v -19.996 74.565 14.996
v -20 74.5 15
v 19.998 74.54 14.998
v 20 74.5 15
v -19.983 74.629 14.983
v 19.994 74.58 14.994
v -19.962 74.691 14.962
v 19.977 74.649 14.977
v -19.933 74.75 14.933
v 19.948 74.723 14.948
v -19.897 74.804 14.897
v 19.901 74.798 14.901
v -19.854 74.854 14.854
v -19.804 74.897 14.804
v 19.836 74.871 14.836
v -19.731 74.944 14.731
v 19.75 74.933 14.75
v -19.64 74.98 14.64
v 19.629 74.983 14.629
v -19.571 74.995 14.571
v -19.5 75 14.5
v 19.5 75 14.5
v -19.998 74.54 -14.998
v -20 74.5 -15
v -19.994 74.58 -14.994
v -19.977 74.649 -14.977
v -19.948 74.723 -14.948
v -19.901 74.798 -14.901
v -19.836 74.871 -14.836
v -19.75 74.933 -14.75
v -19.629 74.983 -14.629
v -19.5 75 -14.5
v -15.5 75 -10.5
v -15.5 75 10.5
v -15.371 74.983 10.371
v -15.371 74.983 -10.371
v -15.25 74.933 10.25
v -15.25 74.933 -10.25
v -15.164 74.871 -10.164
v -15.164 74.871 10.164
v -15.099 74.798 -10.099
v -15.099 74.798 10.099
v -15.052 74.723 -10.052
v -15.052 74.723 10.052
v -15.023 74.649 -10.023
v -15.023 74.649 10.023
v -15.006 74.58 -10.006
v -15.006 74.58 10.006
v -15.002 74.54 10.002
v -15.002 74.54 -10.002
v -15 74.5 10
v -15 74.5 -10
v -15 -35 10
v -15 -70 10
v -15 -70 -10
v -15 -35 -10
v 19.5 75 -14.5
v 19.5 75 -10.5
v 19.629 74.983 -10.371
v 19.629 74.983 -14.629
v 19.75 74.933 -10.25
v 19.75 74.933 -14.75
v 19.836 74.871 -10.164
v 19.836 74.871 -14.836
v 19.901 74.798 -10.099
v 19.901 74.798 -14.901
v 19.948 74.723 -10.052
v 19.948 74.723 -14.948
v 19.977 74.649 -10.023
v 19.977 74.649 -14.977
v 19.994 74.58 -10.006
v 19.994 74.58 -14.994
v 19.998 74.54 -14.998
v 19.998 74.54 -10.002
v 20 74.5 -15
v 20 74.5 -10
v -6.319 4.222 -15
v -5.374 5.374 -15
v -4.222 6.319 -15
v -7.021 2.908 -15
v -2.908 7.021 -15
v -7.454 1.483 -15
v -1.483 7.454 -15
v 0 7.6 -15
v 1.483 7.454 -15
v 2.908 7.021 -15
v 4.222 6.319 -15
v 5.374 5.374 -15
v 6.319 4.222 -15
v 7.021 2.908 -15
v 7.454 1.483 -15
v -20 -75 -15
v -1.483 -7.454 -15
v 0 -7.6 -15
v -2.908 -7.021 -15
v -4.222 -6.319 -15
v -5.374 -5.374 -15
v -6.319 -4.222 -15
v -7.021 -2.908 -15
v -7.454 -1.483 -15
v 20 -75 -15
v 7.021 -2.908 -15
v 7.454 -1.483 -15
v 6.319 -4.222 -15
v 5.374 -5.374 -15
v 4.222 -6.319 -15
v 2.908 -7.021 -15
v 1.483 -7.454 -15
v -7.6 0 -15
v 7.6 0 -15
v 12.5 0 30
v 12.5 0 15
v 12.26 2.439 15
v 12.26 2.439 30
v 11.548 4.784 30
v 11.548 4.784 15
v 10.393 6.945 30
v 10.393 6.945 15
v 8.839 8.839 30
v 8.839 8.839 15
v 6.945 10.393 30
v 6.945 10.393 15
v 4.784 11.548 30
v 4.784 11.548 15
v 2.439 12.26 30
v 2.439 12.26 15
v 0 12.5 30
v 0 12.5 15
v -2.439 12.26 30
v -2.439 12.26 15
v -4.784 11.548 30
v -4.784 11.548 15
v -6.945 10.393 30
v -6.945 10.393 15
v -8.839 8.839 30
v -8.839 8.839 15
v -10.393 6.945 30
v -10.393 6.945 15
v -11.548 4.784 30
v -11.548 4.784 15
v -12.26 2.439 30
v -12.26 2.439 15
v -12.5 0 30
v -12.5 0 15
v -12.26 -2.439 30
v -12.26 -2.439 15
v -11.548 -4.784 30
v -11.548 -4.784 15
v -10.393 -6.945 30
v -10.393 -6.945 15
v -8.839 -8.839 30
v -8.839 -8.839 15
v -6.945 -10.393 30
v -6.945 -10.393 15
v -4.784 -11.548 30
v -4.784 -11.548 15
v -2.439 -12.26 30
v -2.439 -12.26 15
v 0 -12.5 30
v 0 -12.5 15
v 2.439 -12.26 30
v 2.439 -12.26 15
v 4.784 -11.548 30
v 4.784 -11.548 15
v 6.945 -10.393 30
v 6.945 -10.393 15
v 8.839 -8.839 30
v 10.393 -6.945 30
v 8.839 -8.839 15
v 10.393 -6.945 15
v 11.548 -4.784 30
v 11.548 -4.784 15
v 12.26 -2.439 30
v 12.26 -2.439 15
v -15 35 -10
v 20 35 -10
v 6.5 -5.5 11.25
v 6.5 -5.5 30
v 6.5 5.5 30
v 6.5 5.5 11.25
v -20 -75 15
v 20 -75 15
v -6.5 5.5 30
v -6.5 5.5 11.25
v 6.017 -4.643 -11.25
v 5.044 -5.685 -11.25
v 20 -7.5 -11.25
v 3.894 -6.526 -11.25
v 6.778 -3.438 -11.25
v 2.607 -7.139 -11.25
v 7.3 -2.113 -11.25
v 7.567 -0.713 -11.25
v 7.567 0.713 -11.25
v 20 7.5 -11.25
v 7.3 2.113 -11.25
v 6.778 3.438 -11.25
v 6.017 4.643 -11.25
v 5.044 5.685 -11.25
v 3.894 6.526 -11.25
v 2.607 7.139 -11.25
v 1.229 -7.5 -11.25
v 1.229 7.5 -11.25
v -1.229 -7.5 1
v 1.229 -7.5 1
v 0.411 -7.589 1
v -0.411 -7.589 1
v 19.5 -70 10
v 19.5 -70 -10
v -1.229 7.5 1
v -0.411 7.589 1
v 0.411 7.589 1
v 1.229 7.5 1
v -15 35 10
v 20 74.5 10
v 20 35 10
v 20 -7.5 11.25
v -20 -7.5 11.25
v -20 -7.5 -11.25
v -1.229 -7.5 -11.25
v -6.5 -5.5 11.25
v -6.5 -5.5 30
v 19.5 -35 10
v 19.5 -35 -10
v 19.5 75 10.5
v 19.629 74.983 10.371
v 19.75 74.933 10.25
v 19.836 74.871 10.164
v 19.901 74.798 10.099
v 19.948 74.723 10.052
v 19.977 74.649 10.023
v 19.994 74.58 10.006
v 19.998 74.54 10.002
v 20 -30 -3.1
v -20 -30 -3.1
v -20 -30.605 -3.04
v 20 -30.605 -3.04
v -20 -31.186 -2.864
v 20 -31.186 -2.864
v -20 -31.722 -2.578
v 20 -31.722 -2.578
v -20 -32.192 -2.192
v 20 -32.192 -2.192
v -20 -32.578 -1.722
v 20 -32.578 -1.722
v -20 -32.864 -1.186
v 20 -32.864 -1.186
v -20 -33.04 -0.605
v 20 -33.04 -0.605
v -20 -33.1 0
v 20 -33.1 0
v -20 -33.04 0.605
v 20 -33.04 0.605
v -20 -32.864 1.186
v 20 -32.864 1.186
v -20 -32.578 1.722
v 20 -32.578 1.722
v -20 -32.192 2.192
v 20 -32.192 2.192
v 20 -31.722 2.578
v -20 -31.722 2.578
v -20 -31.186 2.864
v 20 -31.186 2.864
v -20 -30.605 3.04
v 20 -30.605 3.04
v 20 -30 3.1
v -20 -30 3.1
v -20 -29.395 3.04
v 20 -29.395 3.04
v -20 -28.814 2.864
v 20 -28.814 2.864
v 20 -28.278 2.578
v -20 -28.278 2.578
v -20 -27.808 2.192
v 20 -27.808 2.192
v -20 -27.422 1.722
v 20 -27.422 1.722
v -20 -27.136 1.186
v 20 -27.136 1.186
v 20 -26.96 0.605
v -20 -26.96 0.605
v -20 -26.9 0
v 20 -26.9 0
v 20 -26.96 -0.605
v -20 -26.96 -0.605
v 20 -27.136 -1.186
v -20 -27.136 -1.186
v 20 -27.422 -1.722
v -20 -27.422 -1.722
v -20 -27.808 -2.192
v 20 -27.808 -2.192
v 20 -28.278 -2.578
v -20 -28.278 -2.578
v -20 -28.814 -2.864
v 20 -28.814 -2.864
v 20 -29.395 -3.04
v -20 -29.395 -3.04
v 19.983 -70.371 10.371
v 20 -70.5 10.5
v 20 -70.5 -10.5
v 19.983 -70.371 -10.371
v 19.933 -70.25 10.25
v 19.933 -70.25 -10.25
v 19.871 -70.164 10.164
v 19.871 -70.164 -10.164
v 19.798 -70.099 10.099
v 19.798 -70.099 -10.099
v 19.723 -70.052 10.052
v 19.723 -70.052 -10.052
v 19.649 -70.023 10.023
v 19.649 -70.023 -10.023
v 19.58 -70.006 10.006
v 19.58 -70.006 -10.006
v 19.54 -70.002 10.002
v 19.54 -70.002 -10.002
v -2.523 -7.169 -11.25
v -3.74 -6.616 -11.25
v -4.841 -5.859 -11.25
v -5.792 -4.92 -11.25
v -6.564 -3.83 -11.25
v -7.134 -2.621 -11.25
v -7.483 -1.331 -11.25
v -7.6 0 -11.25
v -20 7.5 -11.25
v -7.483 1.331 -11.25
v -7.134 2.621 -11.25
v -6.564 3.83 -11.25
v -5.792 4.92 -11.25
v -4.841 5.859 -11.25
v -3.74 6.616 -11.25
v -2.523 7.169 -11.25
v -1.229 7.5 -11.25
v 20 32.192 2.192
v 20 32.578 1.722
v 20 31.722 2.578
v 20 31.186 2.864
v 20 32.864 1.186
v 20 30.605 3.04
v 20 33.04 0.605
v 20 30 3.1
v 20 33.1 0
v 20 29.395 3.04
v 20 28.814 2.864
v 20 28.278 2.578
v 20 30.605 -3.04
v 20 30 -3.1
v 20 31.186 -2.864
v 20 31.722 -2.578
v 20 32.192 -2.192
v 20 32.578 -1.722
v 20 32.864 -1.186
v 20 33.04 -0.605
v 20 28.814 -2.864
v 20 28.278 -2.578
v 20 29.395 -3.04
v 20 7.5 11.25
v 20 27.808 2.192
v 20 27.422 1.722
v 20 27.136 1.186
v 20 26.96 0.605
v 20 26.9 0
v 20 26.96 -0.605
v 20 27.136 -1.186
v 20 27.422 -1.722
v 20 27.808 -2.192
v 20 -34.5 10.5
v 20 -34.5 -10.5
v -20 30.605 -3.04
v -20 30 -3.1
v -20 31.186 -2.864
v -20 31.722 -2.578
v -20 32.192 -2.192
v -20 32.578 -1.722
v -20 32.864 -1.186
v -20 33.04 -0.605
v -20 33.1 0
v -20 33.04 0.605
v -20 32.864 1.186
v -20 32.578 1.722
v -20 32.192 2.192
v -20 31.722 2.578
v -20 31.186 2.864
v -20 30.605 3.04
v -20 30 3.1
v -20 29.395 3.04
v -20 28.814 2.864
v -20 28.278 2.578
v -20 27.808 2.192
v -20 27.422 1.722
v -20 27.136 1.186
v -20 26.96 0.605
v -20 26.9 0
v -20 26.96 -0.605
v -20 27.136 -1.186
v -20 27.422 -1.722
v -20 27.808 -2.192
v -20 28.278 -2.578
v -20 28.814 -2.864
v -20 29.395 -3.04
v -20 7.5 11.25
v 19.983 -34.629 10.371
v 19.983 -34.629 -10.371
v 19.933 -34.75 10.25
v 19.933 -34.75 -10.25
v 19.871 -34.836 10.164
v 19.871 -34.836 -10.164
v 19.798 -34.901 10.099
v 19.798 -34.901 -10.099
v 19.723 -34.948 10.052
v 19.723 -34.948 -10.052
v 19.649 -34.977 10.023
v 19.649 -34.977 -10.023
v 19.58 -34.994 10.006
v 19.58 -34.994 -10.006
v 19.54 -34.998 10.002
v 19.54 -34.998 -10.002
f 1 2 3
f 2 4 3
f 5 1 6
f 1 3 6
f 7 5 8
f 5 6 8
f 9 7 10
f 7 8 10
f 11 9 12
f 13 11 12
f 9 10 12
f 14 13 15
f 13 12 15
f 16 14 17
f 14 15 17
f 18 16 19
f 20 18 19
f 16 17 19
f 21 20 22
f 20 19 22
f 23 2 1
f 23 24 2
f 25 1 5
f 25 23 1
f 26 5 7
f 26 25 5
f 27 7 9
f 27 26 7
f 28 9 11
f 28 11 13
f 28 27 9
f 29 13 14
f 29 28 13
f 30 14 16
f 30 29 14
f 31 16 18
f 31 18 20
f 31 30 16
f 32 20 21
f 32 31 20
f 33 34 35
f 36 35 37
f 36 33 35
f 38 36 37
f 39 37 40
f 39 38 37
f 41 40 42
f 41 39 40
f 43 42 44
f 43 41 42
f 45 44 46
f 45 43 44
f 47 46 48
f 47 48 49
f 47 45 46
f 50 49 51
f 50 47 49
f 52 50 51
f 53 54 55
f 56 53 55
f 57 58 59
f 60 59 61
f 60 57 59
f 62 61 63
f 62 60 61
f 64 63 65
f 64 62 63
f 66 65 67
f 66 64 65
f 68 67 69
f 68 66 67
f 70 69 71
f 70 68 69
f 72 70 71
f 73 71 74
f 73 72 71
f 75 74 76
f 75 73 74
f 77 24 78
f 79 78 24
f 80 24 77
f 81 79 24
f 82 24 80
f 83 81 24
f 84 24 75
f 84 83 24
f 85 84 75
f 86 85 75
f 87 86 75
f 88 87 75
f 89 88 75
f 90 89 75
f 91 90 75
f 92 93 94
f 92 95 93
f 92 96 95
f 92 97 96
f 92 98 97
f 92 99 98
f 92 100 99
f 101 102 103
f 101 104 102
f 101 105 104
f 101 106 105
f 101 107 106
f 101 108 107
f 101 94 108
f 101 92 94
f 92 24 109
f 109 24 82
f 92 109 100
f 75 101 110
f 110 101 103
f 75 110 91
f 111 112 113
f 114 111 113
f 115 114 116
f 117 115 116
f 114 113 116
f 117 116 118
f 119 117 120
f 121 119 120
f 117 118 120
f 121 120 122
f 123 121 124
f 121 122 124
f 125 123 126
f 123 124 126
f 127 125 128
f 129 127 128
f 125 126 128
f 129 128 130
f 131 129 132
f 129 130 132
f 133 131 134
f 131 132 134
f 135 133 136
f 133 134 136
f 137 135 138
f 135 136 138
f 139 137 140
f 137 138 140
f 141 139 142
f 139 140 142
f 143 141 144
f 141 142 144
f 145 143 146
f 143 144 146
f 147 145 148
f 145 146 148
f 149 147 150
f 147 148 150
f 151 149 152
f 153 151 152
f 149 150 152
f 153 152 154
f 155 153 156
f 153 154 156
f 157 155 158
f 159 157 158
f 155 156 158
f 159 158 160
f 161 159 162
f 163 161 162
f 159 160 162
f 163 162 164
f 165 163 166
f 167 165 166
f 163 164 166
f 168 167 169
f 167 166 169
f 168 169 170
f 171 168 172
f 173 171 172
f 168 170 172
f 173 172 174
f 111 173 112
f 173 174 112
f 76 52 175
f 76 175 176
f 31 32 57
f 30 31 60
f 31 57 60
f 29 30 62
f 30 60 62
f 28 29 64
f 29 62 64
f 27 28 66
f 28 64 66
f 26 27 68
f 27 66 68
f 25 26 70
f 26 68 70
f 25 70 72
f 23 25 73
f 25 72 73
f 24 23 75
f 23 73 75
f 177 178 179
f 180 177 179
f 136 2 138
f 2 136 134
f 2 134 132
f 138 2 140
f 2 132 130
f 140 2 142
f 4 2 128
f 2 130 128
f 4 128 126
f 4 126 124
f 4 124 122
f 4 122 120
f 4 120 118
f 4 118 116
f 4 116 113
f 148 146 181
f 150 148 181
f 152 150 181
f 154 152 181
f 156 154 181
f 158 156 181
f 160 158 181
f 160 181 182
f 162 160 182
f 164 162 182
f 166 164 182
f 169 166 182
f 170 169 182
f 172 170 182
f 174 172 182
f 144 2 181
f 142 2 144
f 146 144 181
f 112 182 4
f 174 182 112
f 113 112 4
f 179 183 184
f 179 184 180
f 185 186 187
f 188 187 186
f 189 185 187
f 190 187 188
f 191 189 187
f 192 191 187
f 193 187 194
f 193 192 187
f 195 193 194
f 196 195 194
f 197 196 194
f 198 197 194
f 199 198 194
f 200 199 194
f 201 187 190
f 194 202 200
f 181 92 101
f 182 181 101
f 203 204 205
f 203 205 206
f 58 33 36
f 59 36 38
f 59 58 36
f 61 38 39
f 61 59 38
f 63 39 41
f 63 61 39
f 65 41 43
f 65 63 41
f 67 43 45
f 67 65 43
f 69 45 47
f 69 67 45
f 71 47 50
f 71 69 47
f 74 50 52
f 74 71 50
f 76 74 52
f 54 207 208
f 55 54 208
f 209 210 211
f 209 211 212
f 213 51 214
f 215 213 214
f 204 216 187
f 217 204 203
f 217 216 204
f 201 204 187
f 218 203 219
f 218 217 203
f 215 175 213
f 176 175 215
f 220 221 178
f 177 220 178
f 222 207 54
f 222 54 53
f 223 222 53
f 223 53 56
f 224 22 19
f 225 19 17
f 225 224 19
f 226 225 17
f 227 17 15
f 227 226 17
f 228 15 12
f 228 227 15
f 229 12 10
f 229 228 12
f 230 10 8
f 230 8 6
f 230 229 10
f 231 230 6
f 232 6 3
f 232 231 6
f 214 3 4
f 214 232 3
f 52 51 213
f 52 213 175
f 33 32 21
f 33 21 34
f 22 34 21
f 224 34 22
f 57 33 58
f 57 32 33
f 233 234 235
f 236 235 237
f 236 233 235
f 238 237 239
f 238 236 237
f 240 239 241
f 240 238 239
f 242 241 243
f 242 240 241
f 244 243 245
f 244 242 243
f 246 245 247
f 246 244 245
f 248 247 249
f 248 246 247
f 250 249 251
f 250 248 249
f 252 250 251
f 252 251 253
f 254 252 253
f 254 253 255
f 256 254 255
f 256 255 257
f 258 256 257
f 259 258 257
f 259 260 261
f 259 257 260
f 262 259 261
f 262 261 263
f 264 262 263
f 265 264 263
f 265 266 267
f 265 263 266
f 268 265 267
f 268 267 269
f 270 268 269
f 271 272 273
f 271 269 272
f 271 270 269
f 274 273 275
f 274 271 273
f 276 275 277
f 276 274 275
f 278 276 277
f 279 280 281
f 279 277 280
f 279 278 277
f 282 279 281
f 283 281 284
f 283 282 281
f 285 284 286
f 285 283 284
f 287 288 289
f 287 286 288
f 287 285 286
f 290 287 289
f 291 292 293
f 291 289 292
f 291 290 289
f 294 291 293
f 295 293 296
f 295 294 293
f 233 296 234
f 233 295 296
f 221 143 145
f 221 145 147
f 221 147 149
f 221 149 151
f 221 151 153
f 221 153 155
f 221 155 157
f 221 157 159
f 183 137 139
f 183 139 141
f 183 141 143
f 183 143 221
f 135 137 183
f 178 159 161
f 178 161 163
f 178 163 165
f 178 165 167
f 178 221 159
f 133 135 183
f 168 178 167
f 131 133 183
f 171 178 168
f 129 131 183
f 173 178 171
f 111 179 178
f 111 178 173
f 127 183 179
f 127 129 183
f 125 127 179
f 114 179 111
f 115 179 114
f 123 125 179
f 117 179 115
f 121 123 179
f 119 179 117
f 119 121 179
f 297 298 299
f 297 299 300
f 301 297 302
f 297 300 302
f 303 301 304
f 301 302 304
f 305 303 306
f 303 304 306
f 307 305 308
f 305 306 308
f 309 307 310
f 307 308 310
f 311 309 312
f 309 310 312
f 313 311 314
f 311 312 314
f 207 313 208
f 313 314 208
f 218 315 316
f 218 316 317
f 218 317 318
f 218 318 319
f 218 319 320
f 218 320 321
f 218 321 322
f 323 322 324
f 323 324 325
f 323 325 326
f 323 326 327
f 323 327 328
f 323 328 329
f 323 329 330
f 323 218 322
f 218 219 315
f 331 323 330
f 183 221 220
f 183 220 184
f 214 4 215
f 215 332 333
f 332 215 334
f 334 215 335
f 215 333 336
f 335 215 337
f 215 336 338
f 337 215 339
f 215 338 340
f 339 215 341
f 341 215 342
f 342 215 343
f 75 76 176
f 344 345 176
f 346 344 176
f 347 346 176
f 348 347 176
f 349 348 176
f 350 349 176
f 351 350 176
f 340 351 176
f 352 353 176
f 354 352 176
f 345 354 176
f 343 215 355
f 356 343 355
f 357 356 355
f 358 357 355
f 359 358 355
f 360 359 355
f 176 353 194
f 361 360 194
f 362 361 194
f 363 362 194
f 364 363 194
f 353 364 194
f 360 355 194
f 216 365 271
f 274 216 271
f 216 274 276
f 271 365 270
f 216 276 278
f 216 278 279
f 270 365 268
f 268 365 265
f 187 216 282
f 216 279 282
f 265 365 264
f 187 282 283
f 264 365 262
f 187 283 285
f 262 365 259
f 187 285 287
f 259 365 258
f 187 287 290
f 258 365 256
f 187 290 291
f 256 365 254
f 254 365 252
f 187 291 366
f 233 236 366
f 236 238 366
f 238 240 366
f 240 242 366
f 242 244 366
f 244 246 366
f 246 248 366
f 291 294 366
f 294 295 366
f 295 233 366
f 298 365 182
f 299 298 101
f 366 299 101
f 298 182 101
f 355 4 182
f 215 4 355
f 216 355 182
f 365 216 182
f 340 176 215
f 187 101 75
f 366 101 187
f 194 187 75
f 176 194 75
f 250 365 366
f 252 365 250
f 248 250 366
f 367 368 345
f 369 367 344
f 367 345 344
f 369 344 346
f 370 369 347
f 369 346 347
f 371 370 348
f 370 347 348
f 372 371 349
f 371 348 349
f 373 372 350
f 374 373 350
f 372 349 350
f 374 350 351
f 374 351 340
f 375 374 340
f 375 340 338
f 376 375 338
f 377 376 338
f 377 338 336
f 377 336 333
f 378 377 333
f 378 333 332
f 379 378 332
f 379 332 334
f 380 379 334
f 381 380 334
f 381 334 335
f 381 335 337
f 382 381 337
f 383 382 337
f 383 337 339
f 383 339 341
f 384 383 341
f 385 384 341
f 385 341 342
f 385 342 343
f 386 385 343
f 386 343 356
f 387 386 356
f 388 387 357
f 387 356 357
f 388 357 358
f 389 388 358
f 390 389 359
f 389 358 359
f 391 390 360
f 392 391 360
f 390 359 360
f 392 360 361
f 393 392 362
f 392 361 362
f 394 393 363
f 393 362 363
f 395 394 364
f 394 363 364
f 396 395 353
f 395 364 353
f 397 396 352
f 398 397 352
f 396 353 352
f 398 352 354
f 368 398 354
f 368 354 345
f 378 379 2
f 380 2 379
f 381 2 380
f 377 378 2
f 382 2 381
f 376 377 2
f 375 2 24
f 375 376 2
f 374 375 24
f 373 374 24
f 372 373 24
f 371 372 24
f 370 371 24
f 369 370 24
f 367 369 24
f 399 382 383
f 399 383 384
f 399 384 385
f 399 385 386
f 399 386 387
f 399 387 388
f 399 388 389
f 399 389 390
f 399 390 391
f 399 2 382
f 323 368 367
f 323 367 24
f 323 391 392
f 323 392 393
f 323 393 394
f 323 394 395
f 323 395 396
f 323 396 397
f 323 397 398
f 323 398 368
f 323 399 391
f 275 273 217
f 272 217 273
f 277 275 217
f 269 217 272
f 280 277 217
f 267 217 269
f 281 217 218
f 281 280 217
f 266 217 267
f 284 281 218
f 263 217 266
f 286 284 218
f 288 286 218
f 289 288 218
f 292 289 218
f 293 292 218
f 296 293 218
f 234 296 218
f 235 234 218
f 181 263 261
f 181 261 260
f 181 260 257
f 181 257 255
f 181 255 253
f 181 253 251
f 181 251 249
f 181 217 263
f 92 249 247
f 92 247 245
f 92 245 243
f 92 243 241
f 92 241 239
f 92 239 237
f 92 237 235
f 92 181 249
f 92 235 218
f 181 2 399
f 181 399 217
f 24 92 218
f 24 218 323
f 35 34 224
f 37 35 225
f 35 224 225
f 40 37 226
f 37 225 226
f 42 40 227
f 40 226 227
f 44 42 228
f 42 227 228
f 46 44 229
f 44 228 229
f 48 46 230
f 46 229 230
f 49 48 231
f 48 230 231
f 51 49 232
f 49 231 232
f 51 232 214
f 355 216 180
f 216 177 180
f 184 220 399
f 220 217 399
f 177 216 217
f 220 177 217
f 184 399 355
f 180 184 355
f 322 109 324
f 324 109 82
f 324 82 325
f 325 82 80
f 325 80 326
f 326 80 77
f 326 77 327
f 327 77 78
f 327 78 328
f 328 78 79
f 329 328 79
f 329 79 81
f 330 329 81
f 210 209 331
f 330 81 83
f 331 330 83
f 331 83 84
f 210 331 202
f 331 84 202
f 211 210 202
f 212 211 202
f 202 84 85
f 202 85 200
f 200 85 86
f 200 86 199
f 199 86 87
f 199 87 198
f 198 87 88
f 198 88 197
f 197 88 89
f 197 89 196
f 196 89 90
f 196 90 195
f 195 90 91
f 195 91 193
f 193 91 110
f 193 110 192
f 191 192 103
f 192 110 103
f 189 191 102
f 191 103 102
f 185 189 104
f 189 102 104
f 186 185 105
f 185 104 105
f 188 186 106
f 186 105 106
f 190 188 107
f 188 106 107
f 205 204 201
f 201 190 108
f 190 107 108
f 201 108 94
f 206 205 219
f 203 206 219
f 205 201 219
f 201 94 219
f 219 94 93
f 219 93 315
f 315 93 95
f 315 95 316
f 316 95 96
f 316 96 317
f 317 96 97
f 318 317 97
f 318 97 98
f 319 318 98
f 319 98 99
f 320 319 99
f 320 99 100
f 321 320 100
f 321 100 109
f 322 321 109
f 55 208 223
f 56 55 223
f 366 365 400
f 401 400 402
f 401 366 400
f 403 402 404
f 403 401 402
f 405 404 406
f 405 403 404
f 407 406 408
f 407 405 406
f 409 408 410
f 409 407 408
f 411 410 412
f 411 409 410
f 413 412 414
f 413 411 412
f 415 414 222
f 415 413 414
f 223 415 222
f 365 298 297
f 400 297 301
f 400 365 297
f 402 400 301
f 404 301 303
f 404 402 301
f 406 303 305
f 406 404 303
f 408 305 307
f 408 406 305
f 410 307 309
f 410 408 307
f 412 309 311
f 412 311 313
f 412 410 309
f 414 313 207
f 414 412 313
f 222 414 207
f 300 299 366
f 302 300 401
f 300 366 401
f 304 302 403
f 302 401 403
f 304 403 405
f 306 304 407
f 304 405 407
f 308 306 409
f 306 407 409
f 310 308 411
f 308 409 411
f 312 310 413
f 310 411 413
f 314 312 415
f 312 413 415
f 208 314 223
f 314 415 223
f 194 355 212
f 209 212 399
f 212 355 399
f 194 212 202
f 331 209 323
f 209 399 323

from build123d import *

# Parameters (mm, degrees)
BOSS_EXTRUDE1_DEPTH      = 75
BOSS_EXTRUDE1_DEPTH_BACK = 75
SKETCH1_W                = 40
SKETCH1_H                = 30
SKETCH3_R                = 3.1
CUT_EXTRUDE1_DEPTH       = 150
CUT_EXTRUDE2_DEPTH       = 150
CUT_EXTRUDE2_DEPTH_BACK  = 150
SKETCH4_W                = 22.5
SKETCH4_H                = 15
SKETCH5_R                = 7.6
CUT_EXTRUDE3_DEPTH       = 16
SKETCH7_W                = 58.590655802
SKETCH7_H                = 20
CUT_EXTRUDE5_DEPTH       = 40
SKETCH8_W                = 20
SKETCH8_H                = 35
CUT_EXTRUDE6_DEPTH       = 35
FILLET2_R                = 0.5
FILLET3_R                = 0.5
SKETCH10_R               = 12.5
BOSS_EXTRUDE3_DEPTH      = 15
SKETCH11_W               = 13
SKETCH11_H               = 11
CUT_EXTRUDE7_DEPTH       = 25


with BuildPart() as part:
    # Sketch1 → Boss-Extrude1 (new, two sides: drawn at the far end of the back side and taken through both)
    with BuildSketch(Plane(origin=(0, 0, 0), x_dir=(1, 0, 0), z_dir=(0, 1, 0)).offset(-BOSS_EXTRUDE1_DEPTH_BACK)):
        Rectangle(SKETCH1_W, SKETCH1_H)
    extrude(amount=BOSS_EXTRUDE1_DEPTH + BOSS_EXTRUDE1_DEPTH_BACK)

    # Sketch3 → Cut-Extrude1 (cut)
    with BuildSketch(Plane(origin=(20, 0, 0), x_dir=(0, 0, -1), z_dir=(1, 0, 0))):
        with Locations((0, 30)):
            Circle(SKETCH3_R)
    cut_extrude1 = extrude(amount=-CUT_EXTRUDE1_DEPTH, mode=Mode.SUBTRACT)

    # Mirror1: Cut-Extrude1 across plane
    add(cut_extrude1.mirror(Plane.ZX), mode=Mode.SUBTRACT)

    # Sketch4 → Cut-Extrude2 (cut, two sides: drawn at the far end of the back side and taken through both)
    with BuildSketch(Plane(origin=(0, 0, 0), x_dir=(0, 0, -1), z_dir=(1, 0, 0)).offset(-CUT_EXTRUDE2_DEPTH_BACK)):
        Rectangle(SKETCH4_W, SKETCH4_H)
    extrude(amount=CUT_EXTRUDE2_DEPTH + CUT_EXTRUDE2_DEPTH_BACK, mode=Mode.SUBTRACT)

    # Sketch5 → Cut-Extrude3 (cut)
    with BuildSketch(Plane(origin=(0, 0, -15), x_dir=(-1, 0, 0), z_dir=(0, 0, -1))):
        Circle(SKETCH5_R)
    extrude(amount=-CUT_EXTRUDE3_DEPTH, mode=Mode.SUBTRACT)

    # Sketch7 → Cut-Extrude5 (cut)
    with BuildSketch(Plane(origin=(0, 75, 0), x_dir=(1, 0, 0), z_dir=(0, 1, 0))):
        with Locations((14.295327901, 0)):
            Rectangle(SKETCH7_W, SKETCH7_H)
    extrude(amount=-CUT_EXTRUDE5_DEPTH, mode=Mode.SUBTRACT)

    # Sketch8 → Cut-Extrude6 (cut)
    with BuildSketch(Plane(origin=(20, 0, 0), x_dir=(0, 0, -1), z_dir=(1, 0, 0))):
        with Locations((0, -52.5)):
            Rectangle(SKETCH8_W, SKETCH8_H)
    extrude(amount=-CUT_EXTRUDE6_DEPTH, mode=Mode.SUBTRACT)

    # Fillet2
    fillet2_edges = [part.edges().sort_by_distance(p)[0] for p in [
        (20, 75, 12.5),
        (0, 75, -15),
        (-20, 75, 0),
        (0, 75, 15),
        (20, 75, -12.5),
        (2.5, 75, -10),
        (2.5, 75, 10),
        (-15, 75, 0),
    ]]
    fillet(fillet2_edges, radius=FILLET2_R)

    # Fillet3
    fillet3_edges = [part.edges().sort_by_distance(p)[0] for p in [
        (20, -52.5, 10),
        (20, -70, 0),
        (20, -52.5, -10),
        (20, -35, 0),
    ]]
    fillet(fillet3_edges, radius=FILLET3_R)

    # Sketch10 → Boss-Extrude3 (add)
    with BuildSketch(Plane.XY.offset(15)):
        Circle(SKETCH10_R)
    extrude(amount=BOSS_EXTRUDE3_DEPTH)

    # Sketch11 → Cut-Extrude7 (cut)
    with BuildSketch(Plane.XY.offset(30)):
        Rectangle(SKETCH11_W, SKETCH11_H)
    extrude(amount=-CUT_EXTRUDE7_DEPTH, mode=Mode.SUBTRACT)


solid = part.part
